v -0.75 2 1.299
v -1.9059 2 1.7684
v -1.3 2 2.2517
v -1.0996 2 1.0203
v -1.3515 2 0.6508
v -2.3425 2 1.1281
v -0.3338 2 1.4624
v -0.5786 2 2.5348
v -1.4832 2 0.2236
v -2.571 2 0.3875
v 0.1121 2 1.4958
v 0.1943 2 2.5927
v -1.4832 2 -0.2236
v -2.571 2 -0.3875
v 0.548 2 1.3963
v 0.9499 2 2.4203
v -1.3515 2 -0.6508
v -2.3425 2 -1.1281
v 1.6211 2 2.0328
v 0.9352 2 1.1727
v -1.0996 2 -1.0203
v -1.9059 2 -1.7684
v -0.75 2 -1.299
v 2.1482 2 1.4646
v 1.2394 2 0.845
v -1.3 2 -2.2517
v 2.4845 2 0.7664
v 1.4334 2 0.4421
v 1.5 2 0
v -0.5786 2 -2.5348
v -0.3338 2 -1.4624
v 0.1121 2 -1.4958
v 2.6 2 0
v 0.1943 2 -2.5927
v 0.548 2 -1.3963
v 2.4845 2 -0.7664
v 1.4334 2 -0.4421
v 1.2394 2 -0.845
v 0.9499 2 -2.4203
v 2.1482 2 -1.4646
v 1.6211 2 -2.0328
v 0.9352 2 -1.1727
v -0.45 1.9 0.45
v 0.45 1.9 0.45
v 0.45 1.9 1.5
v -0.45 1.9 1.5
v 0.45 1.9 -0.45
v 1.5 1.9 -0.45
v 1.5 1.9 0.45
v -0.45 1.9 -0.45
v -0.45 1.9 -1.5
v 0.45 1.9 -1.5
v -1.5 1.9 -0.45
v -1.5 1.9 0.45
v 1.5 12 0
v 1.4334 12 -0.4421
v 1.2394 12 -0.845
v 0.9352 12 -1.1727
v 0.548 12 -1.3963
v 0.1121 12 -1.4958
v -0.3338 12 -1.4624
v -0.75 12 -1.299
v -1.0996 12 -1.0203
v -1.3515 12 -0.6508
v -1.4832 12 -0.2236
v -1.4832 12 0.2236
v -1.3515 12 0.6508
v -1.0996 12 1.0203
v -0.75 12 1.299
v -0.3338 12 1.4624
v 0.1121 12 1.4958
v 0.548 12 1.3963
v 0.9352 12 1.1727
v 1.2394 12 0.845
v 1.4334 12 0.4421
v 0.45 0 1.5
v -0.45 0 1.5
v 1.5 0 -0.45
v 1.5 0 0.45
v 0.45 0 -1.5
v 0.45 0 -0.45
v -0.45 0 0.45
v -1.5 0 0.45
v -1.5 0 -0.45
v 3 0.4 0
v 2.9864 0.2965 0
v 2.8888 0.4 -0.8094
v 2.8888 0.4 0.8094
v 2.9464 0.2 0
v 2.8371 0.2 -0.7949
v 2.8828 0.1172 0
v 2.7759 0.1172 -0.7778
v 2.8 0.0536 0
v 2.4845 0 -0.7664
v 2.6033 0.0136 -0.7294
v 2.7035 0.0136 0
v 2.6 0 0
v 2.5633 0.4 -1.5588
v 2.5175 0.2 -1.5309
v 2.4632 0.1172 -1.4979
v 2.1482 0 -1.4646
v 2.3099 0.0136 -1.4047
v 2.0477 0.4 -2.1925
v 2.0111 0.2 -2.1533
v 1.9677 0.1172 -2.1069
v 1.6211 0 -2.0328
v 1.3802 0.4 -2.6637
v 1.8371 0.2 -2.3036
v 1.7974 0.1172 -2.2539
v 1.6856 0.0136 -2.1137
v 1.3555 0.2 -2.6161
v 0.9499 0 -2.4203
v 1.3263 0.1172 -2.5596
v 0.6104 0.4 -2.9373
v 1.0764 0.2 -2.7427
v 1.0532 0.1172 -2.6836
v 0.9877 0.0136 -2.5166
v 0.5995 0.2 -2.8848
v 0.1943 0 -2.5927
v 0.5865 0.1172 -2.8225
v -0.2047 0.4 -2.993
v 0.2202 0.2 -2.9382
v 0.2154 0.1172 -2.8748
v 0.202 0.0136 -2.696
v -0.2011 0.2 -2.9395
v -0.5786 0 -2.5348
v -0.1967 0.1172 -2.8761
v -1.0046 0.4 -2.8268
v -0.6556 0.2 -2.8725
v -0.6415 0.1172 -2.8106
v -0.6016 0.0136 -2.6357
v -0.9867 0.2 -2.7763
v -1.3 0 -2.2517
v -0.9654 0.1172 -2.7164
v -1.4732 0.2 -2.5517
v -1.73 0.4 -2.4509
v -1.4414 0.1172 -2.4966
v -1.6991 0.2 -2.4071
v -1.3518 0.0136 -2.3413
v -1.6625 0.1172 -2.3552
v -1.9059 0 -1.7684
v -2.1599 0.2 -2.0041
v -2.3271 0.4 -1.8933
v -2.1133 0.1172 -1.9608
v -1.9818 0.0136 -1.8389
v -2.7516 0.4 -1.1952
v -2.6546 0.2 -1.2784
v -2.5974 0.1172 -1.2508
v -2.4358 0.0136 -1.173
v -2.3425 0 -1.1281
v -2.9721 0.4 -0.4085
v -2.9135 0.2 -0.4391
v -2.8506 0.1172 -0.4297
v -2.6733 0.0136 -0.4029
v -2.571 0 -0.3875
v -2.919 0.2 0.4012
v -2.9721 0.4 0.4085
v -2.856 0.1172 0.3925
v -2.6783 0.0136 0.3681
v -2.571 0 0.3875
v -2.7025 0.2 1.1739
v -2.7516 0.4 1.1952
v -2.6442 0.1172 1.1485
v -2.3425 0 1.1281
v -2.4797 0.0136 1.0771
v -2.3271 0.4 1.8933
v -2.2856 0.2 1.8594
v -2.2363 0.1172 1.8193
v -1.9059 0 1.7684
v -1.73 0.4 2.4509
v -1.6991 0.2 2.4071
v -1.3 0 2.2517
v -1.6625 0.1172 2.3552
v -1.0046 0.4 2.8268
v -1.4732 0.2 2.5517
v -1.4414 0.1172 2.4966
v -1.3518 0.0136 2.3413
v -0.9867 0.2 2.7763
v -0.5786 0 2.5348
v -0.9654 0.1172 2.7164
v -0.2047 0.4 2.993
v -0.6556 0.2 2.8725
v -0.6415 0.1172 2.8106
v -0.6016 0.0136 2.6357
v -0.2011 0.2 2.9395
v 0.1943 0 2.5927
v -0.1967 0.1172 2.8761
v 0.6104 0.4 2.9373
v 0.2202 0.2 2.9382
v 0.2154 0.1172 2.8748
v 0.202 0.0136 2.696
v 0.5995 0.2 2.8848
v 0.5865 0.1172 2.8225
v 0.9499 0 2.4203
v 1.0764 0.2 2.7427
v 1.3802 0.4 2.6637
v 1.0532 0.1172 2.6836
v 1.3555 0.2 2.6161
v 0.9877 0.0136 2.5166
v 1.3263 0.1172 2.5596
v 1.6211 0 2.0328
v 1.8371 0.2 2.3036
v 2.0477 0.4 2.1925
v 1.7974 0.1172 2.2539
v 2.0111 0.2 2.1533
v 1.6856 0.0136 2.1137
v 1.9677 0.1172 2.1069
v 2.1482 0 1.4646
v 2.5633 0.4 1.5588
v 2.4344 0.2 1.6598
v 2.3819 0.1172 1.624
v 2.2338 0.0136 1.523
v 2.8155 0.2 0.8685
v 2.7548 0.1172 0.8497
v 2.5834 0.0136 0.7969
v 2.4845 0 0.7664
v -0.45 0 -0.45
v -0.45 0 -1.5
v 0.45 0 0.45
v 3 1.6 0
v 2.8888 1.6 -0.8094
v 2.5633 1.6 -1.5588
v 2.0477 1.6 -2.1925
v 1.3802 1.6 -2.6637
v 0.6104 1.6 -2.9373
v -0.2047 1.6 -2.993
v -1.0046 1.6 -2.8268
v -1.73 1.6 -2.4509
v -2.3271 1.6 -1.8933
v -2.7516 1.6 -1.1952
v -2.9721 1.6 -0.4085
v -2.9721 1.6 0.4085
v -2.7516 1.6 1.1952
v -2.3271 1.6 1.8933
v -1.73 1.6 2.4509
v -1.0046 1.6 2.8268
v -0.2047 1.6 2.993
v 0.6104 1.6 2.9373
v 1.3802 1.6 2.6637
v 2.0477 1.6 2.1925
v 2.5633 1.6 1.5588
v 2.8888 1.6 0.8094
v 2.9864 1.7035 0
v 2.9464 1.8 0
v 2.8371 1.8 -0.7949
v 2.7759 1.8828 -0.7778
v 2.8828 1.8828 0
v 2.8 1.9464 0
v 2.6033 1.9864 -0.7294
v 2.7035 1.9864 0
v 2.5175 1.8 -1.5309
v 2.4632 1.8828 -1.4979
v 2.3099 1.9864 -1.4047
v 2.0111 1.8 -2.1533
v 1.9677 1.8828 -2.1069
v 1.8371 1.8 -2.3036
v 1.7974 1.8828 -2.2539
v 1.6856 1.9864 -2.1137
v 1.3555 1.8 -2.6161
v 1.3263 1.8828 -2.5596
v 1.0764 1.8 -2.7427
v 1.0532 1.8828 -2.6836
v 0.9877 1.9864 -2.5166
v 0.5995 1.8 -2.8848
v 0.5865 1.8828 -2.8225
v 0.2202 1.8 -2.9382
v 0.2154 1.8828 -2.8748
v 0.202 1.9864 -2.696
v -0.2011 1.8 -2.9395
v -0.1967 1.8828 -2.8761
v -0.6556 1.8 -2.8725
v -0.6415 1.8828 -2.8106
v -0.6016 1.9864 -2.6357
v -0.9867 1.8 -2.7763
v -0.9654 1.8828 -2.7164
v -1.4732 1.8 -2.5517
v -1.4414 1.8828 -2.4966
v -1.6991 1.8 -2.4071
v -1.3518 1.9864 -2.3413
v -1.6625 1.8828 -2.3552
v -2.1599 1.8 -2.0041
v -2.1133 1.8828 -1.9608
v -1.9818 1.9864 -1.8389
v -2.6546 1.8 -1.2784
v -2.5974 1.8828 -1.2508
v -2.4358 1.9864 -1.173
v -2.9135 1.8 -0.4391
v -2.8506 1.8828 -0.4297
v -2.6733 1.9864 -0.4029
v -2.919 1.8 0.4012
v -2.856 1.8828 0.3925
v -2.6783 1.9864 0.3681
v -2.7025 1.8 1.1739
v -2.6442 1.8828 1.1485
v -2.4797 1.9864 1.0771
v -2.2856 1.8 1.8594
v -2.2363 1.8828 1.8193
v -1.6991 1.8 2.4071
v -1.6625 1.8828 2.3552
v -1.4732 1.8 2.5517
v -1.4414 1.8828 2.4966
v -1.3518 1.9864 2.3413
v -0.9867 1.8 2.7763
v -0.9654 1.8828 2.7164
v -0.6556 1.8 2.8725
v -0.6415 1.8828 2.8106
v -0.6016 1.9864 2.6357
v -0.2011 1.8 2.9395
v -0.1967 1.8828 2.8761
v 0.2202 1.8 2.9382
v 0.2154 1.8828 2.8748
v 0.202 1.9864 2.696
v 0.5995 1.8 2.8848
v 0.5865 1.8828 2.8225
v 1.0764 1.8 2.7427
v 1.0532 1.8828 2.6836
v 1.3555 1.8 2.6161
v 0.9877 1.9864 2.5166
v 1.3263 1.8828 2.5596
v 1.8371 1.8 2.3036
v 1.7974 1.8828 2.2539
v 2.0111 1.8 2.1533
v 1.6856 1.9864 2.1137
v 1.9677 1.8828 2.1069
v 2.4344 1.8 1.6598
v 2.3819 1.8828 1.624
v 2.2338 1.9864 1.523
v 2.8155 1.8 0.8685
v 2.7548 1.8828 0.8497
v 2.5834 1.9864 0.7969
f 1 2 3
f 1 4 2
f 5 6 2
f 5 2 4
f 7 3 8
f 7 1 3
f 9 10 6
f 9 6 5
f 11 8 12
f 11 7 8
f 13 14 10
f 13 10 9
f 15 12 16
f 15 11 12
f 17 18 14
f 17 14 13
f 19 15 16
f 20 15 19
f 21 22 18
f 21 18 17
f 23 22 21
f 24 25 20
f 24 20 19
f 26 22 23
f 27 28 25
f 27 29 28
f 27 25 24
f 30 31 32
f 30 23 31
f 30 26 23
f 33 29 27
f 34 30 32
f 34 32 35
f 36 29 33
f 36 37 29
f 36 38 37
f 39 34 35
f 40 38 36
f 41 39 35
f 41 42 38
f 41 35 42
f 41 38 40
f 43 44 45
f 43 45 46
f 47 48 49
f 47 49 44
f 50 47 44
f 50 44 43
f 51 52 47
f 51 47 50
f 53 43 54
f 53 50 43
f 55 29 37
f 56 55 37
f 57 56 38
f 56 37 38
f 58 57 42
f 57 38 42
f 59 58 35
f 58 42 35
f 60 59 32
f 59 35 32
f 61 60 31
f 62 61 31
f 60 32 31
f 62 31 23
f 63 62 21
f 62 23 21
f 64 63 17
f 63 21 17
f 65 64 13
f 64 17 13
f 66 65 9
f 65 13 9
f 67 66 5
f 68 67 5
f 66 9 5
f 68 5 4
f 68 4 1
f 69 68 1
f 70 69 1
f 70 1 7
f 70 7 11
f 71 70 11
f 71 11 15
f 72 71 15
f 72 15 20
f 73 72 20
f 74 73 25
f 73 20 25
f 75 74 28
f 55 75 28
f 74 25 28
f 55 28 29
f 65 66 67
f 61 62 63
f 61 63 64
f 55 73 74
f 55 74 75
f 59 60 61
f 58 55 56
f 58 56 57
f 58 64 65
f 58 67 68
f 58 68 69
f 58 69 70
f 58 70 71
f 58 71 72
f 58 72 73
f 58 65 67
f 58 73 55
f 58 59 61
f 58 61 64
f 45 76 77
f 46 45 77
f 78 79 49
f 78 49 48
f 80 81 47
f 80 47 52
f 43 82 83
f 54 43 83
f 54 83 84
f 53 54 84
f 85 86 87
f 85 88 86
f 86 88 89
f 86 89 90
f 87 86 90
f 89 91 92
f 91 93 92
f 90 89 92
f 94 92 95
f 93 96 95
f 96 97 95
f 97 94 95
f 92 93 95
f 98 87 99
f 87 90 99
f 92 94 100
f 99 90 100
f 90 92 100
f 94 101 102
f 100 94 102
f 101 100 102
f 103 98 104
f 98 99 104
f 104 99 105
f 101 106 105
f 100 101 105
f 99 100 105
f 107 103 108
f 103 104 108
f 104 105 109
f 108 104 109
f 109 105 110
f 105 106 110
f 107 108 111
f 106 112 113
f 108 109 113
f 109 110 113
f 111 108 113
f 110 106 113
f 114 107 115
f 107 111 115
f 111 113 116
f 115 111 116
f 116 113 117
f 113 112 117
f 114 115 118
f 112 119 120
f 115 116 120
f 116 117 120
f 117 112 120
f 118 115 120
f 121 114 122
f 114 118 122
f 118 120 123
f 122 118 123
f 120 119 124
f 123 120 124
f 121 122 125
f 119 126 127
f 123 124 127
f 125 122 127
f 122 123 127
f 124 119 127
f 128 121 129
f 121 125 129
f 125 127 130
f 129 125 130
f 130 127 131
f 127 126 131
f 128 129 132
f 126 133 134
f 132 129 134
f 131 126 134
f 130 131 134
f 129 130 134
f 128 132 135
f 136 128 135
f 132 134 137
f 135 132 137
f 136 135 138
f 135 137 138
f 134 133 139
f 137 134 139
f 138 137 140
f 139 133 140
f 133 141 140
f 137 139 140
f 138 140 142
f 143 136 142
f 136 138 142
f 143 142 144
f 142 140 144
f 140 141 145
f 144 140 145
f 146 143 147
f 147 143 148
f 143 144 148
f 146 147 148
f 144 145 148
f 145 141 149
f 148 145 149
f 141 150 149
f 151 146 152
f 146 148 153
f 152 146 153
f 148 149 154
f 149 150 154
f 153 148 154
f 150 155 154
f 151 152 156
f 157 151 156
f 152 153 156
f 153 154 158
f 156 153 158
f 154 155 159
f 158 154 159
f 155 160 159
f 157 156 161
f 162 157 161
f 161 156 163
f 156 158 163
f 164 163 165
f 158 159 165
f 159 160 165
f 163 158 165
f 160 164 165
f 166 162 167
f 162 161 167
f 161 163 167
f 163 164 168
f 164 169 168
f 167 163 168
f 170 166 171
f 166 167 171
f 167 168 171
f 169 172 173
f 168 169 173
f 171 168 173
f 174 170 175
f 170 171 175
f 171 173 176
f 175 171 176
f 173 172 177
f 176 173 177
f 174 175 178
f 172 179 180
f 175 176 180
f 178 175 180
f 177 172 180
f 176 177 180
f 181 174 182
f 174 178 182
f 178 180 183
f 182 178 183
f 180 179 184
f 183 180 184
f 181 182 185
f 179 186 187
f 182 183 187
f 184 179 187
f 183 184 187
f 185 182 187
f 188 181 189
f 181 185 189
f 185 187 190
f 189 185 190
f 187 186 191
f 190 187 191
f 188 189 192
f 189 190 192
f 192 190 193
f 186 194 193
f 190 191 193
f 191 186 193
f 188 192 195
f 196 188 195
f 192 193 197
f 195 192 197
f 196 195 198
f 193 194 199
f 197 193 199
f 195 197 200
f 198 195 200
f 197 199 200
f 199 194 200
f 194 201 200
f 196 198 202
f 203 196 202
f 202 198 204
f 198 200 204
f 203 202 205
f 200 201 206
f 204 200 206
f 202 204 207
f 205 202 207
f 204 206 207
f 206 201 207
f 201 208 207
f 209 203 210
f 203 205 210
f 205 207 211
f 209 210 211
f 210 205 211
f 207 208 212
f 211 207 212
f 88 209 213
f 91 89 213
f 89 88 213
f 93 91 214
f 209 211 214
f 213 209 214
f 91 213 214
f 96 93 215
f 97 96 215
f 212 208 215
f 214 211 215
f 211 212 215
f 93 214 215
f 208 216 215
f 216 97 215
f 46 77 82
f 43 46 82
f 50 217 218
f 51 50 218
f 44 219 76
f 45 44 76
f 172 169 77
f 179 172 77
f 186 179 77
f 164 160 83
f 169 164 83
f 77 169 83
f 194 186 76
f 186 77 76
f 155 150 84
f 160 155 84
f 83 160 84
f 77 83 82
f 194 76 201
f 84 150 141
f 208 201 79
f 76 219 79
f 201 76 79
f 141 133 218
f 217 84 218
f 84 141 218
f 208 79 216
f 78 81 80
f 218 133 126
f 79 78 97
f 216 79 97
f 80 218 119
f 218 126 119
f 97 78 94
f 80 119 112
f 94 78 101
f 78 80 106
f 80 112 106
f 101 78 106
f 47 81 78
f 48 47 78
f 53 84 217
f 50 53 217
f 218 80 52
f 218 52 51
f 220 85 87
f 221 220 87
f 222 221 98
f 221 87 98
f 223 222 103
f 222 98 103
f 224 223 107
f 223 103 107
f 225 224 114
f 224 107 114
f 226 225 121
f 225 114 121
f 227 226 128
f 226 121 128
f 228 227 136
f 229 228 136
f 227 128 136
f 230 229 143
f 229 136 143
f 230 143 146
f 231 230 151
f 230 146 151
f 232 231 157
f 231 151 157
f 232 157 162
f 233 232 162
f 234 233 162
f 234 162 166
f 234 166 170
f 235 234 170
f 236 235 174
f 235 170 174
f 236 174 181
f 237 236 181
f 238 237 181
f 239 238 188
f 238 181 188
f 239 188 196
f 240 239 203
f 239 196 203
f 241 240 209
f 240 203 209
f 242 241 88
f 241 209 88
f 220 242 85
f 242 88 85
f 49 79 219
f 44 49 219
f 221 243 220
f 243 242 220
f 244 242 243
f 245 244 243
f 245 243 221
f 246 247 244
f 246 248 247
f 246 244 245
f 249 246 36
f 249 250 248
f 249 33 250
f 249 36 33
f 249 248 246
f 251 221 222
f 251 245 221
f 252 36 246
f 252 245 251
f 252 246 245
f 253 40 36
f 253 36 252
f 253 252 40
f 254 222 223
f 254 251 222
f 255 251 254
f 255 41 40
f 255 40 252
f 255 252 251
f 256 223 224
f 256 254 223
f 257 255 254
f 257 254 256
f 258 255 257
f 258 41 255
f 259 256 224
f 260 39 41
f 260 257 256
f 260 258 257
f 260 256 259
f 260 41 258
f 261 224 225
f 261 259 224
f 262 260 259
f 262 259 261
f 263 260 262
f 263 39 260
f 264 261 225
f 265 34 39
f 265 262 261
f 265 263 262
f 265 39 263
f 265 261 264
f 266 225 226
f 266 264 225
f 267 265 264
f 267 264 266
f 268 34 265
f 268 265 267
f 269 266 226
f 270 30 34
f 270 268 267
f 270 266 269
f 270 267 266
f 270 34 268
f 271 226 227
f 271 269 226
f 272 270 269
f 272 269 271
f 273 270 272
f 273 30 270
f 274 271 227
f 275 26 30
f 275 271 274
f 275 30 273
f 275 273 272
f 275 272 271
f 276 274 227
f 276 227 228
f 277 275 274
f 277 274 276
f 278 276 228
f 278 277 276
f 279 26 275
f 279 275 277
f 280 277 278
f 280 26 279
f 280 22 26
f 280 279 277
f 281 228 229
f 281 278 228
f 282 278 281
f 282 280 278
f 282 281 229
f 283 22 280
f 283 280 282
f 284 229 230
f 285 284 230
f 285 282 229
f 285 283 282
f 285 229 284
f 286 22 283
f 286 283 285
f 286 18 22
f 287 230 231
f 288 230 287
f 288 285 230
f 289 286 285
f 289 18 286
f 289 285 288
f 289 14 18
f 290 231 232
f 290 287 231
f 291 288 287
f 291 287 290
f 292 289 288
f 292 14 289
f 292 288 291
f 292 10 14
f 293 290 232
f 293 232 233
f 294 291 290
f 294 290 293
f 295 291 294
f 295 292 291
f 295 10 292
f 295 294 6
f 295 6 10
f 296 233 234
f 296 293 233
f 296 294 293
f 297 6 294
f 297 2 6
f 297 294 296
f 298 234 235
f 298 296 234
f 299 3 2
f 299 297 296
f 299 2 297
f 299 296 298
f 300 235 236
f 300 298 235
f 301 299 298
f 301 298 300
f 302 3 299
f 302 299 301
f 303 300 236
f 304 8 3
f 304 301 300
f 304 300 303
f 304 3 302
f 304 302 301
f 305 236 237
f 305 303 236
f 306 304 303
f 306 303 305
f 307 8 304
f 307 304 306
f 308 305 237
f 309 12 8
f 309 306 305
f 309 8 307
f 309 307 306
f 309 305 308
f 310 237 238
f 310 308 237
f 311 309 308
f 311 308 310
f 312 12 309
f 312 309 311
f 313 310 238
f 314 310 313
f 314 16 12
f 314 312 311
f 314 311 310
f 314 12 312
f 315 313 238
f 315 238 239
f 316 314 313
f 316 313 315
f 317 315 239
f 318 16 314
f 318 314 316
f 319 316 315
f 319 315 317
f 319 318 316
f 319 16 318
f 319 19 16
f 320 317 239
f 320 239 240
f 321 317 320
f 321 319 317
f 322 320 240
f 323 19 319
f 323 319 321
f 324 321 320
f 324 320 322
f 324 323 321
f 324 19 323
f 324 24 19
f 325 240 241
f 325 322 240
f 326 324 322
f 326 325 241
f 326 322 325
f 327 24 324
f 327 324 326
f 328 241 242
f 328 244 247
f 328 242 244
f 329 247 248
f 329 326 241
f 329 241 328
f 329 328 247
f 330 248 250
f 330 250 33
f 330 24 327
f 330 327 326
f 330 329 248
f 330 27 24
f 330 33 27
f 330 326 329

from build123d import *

# Parameters (mm, degrees)
SKETCH1_R           = 3
BOSS_EXTRUDE1_DEPTH = 2
SKETCH2_R           = 1.5
BOSS_EXTRUDE2_DEPTH = 10
SKETCH3_W           = 0.9
SKETCH3_H           = 0.9
SKETCH3_W_2         = 1.05
SKETCH3_H_2         = 1.05
CUT_EXTRUDE1_DEPTH  = 1.9
FILLET1_R           = 0.4


with BuildPart() as part:
    # Sketch1 → Boss-Extrude1 (new body)
    with BuildSketch(Plane(origin=(0, 0, 0), x_dir=(1, 0, 0), z_dir=(0, 1, 0))):
        Circle(SKETCH1_R)
    extrude(amount=BOSS_EXTRUDE1_DEPTH)

    # Sketch2 → Boss-Extrude2 (add)
    with BuildSketch(Plane(origin=(0, 2, 0), x_dir=(1, 0, 0), z_dir=(0, 1, 0))):
        Circle(SKETCH2_R)
    extrude(amount=BOSS_EXTRUDE2_DEPTH)

    # Sketch3 → Cut-Extrude1 (cut)
    with BuildSketch(Plane(origin=(0, 0, 0), x_dir=(-1, 0, 0), z_dir=(0, -1, 0))):
        Rectangle(SKETCH3_W, SKETCH3_H)
        with Locations((0.975, 0)):
            Rectangle(SKETCH3_W_2, SKETCH3_H)
        with Locations((0, -0.975)):
            Rectangle(SKETCH3_W, SKETCH3_H_2)
        with Locations((-0.975, 0)):
            Rectangle(SKETCH3_W_2, SKETCH3_H)
        with Locations((0, 0.975)):
            Rectangle(SKETCH3_W, SKETCH3_H_2)
    extrude(amount=-CUT_EXTRUDE1_DEPTH, mode=Mode.SUBTRACT)

    # Fillet1
    fillet1_edges = [part.edges().sort_by_distance(p)[0] for p in [
        (-3, 0, 0),
        (-3, 2, 0),
    ]]
    fillet(fillet1_edges, radius=FILLET1_R)


solid = part.part
